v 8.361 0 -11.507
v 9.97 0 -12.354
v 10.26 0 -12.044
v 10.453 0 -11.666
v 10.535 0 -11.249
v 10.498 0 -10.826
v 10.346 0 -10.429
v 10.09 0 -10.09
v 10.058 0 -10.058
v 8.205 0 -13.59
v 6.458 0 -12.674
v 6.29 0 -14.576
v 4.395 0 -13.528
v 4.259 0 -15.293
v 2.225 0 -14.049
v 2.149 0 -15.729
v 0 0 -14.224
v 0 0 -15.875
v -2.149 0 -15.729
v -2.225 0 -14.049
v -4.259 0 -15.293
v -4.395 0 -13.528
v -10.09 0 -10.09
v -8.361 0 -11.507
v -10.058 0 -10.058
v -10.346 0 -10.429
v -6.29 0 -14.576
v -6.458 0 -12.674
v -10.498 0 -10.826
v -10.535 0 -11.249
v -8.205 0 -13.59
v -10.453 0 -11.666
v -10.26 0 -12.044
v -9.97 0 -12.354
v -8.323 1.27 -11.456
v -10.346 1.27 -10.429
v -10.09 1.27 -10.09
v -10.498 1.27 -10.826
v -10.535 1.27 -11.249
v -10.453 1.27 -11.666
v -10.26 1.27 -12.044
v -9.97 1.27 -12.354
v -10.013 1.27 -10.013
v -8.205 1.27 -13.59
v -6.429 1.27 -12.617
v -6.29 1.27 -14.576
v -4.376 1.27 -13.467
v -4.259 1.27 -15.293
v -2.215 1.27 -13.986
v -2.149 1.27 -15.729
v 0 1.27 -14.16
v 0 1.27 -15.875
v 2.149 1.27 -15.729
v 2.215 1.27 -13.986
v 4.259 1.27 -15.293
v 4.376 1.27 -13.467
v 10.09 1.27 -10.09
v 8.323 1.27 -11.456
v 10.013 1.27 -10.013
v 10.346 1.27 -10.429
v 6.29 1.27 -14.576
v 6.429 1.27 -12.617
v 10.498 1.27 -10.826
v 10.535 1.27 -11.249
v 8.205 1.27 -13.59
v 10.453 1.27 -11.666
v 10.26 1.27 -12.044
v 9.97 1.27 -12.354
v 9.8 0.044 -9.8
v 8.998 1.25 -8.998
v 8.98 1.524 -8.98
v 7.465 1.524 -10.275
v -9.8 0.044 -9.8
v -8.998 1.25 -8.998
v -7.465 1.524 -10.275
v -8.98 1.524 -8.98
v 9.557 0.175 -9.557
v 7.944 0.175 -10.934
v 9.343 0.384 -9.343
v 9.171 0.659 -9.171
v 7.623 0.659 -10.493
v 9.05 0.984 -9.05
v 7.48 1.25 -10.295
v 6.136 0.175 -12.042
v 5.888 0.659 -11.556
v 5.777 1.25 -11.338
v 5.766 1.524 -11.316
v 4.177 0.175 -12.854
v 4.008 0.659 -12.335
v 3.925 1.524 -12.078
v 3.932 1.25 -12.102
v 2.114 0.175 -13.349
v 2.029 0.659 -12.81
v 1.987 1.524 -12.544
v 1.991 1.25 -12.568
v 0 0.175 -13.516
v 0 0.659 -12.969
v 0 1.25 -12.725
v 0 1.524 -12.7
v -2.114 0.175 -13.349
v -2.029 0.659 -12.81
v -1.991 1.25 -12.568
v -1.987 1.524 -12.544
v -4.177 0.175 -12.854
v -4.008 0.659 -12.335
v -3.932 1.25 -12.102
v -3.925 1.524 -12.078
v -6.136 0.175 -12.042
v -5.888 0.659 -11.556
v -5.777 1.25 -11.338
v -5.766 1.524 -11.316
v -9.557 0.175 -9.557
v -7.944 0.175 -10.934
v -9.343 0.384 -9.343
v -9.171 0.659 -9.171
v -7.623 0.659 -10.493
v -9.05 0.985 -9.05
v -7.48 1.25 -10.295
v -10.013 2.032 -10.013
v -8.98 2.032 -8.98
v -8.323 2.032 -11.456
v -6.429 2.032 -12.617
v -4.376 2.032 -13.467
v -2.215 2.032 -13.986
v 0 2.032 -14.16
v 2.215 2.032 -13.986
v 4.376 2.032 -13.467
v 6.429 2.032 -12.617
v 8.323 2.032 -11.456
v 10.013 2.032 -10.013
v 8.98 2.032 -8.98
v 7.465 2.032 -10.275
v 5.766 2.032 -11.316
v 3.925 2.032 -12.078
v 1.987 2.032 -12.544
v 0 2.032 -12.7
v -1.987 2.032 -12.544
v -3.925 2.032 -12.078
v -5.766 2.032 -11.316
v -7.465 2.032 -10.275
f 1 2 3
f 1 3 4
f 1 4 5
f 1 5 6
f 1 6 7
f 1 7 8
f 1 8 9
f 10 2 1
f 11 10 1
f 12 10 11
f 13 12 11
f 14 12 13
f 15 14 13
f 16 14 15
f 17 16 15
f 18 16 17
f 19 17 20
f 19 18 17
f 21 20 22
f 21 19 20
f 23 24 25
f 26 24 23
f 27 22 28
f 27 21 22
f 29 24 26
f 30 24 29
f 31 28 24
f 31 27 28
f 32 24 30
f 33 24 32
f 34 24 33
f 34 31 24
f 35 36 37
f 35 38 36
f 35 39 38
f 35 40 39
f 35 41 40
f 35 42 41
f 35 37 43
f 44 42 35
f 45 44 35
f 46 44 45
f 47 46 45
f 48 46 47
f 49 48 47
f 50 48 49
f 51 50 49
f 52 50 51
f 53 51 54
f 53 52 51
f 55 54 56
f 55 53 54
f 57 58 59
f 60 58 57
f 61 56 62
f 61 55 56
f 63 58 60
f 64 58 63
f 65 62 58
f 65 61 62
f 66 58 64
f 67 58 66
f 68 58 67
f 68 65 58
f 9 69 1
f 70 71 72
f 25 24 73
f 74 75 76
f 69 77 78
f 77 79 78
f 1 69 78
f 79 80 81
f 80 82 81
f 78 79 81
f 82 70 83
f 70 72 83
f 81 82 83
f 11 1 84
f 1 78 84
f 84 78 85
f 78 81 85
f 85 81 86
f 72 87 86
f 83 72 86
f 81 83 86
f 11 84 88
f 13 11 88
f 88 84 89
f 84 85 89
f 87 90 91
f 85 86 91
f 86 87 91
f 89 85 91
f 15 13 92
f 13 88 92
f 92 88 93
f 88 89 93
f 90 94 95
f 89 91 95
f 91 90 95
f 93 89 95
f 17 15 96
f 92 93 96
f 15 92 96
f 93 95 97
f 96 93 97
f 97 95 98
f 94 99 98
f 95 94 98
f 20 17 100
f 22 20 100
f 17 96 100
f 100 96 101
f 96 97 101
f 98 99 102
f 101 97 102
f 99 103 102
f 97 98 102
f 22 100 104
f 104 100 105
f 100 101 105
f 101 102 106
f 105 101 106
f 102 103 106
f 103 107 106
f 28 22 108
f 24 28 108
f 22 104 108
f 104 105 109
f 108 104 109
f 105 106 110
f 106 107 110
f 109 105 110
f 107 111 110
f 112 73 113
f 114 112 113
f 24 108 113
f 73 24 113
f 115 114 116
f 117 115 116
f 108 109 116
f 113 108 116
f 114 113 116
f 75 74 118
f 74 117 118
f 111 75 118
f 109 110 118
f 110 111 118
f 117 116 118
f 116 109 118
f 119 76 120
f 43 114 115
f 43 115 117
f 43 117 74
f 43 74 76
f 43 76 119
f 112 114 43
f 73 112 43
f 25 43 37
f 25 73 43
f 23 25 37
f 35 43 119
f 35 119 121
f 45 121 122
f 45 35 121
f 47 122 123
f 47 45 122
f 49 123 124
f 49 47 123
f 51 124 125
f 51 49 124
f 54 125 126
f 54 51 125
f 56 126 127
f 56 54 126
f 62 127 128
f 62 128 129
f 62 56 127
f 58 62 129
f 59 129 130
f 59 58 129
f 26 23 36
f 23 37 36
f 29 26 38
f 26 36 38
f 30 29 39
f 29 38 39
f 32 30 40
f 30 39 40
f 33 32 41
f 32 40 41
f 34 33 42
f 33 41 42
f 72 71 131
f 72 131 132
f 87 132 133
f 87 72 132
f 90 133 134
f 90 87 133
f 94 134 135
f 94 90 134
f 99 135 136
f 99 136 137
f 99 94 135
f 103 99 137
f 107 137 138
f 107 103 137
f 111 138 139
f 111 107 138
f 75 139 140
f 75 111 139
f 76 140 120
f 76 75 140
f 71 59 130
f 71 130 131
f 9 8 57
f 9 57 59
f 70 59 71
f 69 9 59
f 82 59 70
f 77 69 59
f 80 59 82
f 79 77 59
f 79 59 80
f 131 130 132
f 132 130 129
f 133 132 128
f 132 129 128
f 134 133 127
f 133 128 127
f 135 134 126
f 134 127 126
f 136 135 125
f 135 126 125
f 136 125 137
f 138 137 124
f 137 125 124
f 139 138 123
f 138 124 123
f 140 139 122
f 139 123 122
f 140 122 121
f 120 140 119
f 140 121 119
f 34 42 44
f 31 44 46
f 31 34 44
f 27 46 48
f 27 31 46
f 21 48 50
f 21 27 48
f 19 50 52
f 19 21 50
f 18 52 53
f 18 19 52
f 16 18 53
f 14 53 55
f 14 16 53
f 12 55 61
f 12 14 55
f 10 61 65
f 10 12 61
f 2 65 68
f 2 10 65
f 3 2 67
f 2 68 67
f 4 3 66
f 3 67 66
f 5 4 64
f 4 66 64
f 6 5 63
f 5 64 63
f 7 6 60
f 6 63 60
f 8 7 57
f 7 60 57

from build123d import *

# Parameters (mm, degrees)
BOSS_EXTRUDE1_DEPTH = 2.032
CUT_EXTRUDE1_START  = -0.762
CUT_EXTRUDE1_DEPTH  = 0.762
FILLET2_R           = 1.524
FILLET1_R           = 1.524


with BuildPart() as part:
    # Sketch1 → Boss-Extrude1 (new body)
    with BuildSketch(Plane(origin=(0, 0, 0), x_dir=(1, 0, 0), z_dir=(0, 1, 0))):
        with BuildLine():
            Line((-8.980256121, 8.980256121), (-11.225320151, 11.225320151))
            ThreePointArc((-11.225320151, 11.225320151), (0, 15.875), (11.225320151, 11.225320151))
            Line((11.225320151, 11.225320151), (8.980256121, 8.980256121))
            ThreePointArc((8.980256121, 8.980256121), (0, 12.7), (-8.980256121, 8.980256121))
        make_face()
    extrude(amount=BOSS_EXTRUDE1_DEPTH)

    # Sketch2 → Cut-Extrude1 (cut)
    with BuildSketch(Plane(origin=(0, 2.032, 0), x_dir=(1, 0, 0), z_dir=(0, 1, 0)).offset(CUT_EXTRUDE1_START)):
        with BuildLine():
            Line((10.012985575, 10.012985575), (11.225320151, 11.225320151))
            ThreePointArc((11.225320151, 11.225320151), (0, 15.875), (-11.225320151, 11.225320151))
            Line((-11.225320151, 11.225320151), (-10.012985575, 10.012985575))
            ThreePointArc((-10.012985575, 10.012985575), (0, 14.1605), (10.012985575, 10.012985575))
        make_face()
    extrude(amount=CUT_EXTRUDE1_DEPTH, mode=Mode.SUBTRACT)

    # Fillet2
    fillet2_edges = [part.edges().sort_by_distance(p)[0] for p in [
        (0, 0, -12.7),
    ]]
    fillet(fillet2_edges, radius=FILLET2_R)

    # Fillet1
    fillet1_edges = [part.edges().sort_by_distance(p)[0] for p in [
        (-11.225320151, 0.635, -11.225320151),
        (11.225320151, 0.635, -11.225320151),
    ]]
    fillet(fillet1_edges, radius=FILLET1_R)


solid = part.part
